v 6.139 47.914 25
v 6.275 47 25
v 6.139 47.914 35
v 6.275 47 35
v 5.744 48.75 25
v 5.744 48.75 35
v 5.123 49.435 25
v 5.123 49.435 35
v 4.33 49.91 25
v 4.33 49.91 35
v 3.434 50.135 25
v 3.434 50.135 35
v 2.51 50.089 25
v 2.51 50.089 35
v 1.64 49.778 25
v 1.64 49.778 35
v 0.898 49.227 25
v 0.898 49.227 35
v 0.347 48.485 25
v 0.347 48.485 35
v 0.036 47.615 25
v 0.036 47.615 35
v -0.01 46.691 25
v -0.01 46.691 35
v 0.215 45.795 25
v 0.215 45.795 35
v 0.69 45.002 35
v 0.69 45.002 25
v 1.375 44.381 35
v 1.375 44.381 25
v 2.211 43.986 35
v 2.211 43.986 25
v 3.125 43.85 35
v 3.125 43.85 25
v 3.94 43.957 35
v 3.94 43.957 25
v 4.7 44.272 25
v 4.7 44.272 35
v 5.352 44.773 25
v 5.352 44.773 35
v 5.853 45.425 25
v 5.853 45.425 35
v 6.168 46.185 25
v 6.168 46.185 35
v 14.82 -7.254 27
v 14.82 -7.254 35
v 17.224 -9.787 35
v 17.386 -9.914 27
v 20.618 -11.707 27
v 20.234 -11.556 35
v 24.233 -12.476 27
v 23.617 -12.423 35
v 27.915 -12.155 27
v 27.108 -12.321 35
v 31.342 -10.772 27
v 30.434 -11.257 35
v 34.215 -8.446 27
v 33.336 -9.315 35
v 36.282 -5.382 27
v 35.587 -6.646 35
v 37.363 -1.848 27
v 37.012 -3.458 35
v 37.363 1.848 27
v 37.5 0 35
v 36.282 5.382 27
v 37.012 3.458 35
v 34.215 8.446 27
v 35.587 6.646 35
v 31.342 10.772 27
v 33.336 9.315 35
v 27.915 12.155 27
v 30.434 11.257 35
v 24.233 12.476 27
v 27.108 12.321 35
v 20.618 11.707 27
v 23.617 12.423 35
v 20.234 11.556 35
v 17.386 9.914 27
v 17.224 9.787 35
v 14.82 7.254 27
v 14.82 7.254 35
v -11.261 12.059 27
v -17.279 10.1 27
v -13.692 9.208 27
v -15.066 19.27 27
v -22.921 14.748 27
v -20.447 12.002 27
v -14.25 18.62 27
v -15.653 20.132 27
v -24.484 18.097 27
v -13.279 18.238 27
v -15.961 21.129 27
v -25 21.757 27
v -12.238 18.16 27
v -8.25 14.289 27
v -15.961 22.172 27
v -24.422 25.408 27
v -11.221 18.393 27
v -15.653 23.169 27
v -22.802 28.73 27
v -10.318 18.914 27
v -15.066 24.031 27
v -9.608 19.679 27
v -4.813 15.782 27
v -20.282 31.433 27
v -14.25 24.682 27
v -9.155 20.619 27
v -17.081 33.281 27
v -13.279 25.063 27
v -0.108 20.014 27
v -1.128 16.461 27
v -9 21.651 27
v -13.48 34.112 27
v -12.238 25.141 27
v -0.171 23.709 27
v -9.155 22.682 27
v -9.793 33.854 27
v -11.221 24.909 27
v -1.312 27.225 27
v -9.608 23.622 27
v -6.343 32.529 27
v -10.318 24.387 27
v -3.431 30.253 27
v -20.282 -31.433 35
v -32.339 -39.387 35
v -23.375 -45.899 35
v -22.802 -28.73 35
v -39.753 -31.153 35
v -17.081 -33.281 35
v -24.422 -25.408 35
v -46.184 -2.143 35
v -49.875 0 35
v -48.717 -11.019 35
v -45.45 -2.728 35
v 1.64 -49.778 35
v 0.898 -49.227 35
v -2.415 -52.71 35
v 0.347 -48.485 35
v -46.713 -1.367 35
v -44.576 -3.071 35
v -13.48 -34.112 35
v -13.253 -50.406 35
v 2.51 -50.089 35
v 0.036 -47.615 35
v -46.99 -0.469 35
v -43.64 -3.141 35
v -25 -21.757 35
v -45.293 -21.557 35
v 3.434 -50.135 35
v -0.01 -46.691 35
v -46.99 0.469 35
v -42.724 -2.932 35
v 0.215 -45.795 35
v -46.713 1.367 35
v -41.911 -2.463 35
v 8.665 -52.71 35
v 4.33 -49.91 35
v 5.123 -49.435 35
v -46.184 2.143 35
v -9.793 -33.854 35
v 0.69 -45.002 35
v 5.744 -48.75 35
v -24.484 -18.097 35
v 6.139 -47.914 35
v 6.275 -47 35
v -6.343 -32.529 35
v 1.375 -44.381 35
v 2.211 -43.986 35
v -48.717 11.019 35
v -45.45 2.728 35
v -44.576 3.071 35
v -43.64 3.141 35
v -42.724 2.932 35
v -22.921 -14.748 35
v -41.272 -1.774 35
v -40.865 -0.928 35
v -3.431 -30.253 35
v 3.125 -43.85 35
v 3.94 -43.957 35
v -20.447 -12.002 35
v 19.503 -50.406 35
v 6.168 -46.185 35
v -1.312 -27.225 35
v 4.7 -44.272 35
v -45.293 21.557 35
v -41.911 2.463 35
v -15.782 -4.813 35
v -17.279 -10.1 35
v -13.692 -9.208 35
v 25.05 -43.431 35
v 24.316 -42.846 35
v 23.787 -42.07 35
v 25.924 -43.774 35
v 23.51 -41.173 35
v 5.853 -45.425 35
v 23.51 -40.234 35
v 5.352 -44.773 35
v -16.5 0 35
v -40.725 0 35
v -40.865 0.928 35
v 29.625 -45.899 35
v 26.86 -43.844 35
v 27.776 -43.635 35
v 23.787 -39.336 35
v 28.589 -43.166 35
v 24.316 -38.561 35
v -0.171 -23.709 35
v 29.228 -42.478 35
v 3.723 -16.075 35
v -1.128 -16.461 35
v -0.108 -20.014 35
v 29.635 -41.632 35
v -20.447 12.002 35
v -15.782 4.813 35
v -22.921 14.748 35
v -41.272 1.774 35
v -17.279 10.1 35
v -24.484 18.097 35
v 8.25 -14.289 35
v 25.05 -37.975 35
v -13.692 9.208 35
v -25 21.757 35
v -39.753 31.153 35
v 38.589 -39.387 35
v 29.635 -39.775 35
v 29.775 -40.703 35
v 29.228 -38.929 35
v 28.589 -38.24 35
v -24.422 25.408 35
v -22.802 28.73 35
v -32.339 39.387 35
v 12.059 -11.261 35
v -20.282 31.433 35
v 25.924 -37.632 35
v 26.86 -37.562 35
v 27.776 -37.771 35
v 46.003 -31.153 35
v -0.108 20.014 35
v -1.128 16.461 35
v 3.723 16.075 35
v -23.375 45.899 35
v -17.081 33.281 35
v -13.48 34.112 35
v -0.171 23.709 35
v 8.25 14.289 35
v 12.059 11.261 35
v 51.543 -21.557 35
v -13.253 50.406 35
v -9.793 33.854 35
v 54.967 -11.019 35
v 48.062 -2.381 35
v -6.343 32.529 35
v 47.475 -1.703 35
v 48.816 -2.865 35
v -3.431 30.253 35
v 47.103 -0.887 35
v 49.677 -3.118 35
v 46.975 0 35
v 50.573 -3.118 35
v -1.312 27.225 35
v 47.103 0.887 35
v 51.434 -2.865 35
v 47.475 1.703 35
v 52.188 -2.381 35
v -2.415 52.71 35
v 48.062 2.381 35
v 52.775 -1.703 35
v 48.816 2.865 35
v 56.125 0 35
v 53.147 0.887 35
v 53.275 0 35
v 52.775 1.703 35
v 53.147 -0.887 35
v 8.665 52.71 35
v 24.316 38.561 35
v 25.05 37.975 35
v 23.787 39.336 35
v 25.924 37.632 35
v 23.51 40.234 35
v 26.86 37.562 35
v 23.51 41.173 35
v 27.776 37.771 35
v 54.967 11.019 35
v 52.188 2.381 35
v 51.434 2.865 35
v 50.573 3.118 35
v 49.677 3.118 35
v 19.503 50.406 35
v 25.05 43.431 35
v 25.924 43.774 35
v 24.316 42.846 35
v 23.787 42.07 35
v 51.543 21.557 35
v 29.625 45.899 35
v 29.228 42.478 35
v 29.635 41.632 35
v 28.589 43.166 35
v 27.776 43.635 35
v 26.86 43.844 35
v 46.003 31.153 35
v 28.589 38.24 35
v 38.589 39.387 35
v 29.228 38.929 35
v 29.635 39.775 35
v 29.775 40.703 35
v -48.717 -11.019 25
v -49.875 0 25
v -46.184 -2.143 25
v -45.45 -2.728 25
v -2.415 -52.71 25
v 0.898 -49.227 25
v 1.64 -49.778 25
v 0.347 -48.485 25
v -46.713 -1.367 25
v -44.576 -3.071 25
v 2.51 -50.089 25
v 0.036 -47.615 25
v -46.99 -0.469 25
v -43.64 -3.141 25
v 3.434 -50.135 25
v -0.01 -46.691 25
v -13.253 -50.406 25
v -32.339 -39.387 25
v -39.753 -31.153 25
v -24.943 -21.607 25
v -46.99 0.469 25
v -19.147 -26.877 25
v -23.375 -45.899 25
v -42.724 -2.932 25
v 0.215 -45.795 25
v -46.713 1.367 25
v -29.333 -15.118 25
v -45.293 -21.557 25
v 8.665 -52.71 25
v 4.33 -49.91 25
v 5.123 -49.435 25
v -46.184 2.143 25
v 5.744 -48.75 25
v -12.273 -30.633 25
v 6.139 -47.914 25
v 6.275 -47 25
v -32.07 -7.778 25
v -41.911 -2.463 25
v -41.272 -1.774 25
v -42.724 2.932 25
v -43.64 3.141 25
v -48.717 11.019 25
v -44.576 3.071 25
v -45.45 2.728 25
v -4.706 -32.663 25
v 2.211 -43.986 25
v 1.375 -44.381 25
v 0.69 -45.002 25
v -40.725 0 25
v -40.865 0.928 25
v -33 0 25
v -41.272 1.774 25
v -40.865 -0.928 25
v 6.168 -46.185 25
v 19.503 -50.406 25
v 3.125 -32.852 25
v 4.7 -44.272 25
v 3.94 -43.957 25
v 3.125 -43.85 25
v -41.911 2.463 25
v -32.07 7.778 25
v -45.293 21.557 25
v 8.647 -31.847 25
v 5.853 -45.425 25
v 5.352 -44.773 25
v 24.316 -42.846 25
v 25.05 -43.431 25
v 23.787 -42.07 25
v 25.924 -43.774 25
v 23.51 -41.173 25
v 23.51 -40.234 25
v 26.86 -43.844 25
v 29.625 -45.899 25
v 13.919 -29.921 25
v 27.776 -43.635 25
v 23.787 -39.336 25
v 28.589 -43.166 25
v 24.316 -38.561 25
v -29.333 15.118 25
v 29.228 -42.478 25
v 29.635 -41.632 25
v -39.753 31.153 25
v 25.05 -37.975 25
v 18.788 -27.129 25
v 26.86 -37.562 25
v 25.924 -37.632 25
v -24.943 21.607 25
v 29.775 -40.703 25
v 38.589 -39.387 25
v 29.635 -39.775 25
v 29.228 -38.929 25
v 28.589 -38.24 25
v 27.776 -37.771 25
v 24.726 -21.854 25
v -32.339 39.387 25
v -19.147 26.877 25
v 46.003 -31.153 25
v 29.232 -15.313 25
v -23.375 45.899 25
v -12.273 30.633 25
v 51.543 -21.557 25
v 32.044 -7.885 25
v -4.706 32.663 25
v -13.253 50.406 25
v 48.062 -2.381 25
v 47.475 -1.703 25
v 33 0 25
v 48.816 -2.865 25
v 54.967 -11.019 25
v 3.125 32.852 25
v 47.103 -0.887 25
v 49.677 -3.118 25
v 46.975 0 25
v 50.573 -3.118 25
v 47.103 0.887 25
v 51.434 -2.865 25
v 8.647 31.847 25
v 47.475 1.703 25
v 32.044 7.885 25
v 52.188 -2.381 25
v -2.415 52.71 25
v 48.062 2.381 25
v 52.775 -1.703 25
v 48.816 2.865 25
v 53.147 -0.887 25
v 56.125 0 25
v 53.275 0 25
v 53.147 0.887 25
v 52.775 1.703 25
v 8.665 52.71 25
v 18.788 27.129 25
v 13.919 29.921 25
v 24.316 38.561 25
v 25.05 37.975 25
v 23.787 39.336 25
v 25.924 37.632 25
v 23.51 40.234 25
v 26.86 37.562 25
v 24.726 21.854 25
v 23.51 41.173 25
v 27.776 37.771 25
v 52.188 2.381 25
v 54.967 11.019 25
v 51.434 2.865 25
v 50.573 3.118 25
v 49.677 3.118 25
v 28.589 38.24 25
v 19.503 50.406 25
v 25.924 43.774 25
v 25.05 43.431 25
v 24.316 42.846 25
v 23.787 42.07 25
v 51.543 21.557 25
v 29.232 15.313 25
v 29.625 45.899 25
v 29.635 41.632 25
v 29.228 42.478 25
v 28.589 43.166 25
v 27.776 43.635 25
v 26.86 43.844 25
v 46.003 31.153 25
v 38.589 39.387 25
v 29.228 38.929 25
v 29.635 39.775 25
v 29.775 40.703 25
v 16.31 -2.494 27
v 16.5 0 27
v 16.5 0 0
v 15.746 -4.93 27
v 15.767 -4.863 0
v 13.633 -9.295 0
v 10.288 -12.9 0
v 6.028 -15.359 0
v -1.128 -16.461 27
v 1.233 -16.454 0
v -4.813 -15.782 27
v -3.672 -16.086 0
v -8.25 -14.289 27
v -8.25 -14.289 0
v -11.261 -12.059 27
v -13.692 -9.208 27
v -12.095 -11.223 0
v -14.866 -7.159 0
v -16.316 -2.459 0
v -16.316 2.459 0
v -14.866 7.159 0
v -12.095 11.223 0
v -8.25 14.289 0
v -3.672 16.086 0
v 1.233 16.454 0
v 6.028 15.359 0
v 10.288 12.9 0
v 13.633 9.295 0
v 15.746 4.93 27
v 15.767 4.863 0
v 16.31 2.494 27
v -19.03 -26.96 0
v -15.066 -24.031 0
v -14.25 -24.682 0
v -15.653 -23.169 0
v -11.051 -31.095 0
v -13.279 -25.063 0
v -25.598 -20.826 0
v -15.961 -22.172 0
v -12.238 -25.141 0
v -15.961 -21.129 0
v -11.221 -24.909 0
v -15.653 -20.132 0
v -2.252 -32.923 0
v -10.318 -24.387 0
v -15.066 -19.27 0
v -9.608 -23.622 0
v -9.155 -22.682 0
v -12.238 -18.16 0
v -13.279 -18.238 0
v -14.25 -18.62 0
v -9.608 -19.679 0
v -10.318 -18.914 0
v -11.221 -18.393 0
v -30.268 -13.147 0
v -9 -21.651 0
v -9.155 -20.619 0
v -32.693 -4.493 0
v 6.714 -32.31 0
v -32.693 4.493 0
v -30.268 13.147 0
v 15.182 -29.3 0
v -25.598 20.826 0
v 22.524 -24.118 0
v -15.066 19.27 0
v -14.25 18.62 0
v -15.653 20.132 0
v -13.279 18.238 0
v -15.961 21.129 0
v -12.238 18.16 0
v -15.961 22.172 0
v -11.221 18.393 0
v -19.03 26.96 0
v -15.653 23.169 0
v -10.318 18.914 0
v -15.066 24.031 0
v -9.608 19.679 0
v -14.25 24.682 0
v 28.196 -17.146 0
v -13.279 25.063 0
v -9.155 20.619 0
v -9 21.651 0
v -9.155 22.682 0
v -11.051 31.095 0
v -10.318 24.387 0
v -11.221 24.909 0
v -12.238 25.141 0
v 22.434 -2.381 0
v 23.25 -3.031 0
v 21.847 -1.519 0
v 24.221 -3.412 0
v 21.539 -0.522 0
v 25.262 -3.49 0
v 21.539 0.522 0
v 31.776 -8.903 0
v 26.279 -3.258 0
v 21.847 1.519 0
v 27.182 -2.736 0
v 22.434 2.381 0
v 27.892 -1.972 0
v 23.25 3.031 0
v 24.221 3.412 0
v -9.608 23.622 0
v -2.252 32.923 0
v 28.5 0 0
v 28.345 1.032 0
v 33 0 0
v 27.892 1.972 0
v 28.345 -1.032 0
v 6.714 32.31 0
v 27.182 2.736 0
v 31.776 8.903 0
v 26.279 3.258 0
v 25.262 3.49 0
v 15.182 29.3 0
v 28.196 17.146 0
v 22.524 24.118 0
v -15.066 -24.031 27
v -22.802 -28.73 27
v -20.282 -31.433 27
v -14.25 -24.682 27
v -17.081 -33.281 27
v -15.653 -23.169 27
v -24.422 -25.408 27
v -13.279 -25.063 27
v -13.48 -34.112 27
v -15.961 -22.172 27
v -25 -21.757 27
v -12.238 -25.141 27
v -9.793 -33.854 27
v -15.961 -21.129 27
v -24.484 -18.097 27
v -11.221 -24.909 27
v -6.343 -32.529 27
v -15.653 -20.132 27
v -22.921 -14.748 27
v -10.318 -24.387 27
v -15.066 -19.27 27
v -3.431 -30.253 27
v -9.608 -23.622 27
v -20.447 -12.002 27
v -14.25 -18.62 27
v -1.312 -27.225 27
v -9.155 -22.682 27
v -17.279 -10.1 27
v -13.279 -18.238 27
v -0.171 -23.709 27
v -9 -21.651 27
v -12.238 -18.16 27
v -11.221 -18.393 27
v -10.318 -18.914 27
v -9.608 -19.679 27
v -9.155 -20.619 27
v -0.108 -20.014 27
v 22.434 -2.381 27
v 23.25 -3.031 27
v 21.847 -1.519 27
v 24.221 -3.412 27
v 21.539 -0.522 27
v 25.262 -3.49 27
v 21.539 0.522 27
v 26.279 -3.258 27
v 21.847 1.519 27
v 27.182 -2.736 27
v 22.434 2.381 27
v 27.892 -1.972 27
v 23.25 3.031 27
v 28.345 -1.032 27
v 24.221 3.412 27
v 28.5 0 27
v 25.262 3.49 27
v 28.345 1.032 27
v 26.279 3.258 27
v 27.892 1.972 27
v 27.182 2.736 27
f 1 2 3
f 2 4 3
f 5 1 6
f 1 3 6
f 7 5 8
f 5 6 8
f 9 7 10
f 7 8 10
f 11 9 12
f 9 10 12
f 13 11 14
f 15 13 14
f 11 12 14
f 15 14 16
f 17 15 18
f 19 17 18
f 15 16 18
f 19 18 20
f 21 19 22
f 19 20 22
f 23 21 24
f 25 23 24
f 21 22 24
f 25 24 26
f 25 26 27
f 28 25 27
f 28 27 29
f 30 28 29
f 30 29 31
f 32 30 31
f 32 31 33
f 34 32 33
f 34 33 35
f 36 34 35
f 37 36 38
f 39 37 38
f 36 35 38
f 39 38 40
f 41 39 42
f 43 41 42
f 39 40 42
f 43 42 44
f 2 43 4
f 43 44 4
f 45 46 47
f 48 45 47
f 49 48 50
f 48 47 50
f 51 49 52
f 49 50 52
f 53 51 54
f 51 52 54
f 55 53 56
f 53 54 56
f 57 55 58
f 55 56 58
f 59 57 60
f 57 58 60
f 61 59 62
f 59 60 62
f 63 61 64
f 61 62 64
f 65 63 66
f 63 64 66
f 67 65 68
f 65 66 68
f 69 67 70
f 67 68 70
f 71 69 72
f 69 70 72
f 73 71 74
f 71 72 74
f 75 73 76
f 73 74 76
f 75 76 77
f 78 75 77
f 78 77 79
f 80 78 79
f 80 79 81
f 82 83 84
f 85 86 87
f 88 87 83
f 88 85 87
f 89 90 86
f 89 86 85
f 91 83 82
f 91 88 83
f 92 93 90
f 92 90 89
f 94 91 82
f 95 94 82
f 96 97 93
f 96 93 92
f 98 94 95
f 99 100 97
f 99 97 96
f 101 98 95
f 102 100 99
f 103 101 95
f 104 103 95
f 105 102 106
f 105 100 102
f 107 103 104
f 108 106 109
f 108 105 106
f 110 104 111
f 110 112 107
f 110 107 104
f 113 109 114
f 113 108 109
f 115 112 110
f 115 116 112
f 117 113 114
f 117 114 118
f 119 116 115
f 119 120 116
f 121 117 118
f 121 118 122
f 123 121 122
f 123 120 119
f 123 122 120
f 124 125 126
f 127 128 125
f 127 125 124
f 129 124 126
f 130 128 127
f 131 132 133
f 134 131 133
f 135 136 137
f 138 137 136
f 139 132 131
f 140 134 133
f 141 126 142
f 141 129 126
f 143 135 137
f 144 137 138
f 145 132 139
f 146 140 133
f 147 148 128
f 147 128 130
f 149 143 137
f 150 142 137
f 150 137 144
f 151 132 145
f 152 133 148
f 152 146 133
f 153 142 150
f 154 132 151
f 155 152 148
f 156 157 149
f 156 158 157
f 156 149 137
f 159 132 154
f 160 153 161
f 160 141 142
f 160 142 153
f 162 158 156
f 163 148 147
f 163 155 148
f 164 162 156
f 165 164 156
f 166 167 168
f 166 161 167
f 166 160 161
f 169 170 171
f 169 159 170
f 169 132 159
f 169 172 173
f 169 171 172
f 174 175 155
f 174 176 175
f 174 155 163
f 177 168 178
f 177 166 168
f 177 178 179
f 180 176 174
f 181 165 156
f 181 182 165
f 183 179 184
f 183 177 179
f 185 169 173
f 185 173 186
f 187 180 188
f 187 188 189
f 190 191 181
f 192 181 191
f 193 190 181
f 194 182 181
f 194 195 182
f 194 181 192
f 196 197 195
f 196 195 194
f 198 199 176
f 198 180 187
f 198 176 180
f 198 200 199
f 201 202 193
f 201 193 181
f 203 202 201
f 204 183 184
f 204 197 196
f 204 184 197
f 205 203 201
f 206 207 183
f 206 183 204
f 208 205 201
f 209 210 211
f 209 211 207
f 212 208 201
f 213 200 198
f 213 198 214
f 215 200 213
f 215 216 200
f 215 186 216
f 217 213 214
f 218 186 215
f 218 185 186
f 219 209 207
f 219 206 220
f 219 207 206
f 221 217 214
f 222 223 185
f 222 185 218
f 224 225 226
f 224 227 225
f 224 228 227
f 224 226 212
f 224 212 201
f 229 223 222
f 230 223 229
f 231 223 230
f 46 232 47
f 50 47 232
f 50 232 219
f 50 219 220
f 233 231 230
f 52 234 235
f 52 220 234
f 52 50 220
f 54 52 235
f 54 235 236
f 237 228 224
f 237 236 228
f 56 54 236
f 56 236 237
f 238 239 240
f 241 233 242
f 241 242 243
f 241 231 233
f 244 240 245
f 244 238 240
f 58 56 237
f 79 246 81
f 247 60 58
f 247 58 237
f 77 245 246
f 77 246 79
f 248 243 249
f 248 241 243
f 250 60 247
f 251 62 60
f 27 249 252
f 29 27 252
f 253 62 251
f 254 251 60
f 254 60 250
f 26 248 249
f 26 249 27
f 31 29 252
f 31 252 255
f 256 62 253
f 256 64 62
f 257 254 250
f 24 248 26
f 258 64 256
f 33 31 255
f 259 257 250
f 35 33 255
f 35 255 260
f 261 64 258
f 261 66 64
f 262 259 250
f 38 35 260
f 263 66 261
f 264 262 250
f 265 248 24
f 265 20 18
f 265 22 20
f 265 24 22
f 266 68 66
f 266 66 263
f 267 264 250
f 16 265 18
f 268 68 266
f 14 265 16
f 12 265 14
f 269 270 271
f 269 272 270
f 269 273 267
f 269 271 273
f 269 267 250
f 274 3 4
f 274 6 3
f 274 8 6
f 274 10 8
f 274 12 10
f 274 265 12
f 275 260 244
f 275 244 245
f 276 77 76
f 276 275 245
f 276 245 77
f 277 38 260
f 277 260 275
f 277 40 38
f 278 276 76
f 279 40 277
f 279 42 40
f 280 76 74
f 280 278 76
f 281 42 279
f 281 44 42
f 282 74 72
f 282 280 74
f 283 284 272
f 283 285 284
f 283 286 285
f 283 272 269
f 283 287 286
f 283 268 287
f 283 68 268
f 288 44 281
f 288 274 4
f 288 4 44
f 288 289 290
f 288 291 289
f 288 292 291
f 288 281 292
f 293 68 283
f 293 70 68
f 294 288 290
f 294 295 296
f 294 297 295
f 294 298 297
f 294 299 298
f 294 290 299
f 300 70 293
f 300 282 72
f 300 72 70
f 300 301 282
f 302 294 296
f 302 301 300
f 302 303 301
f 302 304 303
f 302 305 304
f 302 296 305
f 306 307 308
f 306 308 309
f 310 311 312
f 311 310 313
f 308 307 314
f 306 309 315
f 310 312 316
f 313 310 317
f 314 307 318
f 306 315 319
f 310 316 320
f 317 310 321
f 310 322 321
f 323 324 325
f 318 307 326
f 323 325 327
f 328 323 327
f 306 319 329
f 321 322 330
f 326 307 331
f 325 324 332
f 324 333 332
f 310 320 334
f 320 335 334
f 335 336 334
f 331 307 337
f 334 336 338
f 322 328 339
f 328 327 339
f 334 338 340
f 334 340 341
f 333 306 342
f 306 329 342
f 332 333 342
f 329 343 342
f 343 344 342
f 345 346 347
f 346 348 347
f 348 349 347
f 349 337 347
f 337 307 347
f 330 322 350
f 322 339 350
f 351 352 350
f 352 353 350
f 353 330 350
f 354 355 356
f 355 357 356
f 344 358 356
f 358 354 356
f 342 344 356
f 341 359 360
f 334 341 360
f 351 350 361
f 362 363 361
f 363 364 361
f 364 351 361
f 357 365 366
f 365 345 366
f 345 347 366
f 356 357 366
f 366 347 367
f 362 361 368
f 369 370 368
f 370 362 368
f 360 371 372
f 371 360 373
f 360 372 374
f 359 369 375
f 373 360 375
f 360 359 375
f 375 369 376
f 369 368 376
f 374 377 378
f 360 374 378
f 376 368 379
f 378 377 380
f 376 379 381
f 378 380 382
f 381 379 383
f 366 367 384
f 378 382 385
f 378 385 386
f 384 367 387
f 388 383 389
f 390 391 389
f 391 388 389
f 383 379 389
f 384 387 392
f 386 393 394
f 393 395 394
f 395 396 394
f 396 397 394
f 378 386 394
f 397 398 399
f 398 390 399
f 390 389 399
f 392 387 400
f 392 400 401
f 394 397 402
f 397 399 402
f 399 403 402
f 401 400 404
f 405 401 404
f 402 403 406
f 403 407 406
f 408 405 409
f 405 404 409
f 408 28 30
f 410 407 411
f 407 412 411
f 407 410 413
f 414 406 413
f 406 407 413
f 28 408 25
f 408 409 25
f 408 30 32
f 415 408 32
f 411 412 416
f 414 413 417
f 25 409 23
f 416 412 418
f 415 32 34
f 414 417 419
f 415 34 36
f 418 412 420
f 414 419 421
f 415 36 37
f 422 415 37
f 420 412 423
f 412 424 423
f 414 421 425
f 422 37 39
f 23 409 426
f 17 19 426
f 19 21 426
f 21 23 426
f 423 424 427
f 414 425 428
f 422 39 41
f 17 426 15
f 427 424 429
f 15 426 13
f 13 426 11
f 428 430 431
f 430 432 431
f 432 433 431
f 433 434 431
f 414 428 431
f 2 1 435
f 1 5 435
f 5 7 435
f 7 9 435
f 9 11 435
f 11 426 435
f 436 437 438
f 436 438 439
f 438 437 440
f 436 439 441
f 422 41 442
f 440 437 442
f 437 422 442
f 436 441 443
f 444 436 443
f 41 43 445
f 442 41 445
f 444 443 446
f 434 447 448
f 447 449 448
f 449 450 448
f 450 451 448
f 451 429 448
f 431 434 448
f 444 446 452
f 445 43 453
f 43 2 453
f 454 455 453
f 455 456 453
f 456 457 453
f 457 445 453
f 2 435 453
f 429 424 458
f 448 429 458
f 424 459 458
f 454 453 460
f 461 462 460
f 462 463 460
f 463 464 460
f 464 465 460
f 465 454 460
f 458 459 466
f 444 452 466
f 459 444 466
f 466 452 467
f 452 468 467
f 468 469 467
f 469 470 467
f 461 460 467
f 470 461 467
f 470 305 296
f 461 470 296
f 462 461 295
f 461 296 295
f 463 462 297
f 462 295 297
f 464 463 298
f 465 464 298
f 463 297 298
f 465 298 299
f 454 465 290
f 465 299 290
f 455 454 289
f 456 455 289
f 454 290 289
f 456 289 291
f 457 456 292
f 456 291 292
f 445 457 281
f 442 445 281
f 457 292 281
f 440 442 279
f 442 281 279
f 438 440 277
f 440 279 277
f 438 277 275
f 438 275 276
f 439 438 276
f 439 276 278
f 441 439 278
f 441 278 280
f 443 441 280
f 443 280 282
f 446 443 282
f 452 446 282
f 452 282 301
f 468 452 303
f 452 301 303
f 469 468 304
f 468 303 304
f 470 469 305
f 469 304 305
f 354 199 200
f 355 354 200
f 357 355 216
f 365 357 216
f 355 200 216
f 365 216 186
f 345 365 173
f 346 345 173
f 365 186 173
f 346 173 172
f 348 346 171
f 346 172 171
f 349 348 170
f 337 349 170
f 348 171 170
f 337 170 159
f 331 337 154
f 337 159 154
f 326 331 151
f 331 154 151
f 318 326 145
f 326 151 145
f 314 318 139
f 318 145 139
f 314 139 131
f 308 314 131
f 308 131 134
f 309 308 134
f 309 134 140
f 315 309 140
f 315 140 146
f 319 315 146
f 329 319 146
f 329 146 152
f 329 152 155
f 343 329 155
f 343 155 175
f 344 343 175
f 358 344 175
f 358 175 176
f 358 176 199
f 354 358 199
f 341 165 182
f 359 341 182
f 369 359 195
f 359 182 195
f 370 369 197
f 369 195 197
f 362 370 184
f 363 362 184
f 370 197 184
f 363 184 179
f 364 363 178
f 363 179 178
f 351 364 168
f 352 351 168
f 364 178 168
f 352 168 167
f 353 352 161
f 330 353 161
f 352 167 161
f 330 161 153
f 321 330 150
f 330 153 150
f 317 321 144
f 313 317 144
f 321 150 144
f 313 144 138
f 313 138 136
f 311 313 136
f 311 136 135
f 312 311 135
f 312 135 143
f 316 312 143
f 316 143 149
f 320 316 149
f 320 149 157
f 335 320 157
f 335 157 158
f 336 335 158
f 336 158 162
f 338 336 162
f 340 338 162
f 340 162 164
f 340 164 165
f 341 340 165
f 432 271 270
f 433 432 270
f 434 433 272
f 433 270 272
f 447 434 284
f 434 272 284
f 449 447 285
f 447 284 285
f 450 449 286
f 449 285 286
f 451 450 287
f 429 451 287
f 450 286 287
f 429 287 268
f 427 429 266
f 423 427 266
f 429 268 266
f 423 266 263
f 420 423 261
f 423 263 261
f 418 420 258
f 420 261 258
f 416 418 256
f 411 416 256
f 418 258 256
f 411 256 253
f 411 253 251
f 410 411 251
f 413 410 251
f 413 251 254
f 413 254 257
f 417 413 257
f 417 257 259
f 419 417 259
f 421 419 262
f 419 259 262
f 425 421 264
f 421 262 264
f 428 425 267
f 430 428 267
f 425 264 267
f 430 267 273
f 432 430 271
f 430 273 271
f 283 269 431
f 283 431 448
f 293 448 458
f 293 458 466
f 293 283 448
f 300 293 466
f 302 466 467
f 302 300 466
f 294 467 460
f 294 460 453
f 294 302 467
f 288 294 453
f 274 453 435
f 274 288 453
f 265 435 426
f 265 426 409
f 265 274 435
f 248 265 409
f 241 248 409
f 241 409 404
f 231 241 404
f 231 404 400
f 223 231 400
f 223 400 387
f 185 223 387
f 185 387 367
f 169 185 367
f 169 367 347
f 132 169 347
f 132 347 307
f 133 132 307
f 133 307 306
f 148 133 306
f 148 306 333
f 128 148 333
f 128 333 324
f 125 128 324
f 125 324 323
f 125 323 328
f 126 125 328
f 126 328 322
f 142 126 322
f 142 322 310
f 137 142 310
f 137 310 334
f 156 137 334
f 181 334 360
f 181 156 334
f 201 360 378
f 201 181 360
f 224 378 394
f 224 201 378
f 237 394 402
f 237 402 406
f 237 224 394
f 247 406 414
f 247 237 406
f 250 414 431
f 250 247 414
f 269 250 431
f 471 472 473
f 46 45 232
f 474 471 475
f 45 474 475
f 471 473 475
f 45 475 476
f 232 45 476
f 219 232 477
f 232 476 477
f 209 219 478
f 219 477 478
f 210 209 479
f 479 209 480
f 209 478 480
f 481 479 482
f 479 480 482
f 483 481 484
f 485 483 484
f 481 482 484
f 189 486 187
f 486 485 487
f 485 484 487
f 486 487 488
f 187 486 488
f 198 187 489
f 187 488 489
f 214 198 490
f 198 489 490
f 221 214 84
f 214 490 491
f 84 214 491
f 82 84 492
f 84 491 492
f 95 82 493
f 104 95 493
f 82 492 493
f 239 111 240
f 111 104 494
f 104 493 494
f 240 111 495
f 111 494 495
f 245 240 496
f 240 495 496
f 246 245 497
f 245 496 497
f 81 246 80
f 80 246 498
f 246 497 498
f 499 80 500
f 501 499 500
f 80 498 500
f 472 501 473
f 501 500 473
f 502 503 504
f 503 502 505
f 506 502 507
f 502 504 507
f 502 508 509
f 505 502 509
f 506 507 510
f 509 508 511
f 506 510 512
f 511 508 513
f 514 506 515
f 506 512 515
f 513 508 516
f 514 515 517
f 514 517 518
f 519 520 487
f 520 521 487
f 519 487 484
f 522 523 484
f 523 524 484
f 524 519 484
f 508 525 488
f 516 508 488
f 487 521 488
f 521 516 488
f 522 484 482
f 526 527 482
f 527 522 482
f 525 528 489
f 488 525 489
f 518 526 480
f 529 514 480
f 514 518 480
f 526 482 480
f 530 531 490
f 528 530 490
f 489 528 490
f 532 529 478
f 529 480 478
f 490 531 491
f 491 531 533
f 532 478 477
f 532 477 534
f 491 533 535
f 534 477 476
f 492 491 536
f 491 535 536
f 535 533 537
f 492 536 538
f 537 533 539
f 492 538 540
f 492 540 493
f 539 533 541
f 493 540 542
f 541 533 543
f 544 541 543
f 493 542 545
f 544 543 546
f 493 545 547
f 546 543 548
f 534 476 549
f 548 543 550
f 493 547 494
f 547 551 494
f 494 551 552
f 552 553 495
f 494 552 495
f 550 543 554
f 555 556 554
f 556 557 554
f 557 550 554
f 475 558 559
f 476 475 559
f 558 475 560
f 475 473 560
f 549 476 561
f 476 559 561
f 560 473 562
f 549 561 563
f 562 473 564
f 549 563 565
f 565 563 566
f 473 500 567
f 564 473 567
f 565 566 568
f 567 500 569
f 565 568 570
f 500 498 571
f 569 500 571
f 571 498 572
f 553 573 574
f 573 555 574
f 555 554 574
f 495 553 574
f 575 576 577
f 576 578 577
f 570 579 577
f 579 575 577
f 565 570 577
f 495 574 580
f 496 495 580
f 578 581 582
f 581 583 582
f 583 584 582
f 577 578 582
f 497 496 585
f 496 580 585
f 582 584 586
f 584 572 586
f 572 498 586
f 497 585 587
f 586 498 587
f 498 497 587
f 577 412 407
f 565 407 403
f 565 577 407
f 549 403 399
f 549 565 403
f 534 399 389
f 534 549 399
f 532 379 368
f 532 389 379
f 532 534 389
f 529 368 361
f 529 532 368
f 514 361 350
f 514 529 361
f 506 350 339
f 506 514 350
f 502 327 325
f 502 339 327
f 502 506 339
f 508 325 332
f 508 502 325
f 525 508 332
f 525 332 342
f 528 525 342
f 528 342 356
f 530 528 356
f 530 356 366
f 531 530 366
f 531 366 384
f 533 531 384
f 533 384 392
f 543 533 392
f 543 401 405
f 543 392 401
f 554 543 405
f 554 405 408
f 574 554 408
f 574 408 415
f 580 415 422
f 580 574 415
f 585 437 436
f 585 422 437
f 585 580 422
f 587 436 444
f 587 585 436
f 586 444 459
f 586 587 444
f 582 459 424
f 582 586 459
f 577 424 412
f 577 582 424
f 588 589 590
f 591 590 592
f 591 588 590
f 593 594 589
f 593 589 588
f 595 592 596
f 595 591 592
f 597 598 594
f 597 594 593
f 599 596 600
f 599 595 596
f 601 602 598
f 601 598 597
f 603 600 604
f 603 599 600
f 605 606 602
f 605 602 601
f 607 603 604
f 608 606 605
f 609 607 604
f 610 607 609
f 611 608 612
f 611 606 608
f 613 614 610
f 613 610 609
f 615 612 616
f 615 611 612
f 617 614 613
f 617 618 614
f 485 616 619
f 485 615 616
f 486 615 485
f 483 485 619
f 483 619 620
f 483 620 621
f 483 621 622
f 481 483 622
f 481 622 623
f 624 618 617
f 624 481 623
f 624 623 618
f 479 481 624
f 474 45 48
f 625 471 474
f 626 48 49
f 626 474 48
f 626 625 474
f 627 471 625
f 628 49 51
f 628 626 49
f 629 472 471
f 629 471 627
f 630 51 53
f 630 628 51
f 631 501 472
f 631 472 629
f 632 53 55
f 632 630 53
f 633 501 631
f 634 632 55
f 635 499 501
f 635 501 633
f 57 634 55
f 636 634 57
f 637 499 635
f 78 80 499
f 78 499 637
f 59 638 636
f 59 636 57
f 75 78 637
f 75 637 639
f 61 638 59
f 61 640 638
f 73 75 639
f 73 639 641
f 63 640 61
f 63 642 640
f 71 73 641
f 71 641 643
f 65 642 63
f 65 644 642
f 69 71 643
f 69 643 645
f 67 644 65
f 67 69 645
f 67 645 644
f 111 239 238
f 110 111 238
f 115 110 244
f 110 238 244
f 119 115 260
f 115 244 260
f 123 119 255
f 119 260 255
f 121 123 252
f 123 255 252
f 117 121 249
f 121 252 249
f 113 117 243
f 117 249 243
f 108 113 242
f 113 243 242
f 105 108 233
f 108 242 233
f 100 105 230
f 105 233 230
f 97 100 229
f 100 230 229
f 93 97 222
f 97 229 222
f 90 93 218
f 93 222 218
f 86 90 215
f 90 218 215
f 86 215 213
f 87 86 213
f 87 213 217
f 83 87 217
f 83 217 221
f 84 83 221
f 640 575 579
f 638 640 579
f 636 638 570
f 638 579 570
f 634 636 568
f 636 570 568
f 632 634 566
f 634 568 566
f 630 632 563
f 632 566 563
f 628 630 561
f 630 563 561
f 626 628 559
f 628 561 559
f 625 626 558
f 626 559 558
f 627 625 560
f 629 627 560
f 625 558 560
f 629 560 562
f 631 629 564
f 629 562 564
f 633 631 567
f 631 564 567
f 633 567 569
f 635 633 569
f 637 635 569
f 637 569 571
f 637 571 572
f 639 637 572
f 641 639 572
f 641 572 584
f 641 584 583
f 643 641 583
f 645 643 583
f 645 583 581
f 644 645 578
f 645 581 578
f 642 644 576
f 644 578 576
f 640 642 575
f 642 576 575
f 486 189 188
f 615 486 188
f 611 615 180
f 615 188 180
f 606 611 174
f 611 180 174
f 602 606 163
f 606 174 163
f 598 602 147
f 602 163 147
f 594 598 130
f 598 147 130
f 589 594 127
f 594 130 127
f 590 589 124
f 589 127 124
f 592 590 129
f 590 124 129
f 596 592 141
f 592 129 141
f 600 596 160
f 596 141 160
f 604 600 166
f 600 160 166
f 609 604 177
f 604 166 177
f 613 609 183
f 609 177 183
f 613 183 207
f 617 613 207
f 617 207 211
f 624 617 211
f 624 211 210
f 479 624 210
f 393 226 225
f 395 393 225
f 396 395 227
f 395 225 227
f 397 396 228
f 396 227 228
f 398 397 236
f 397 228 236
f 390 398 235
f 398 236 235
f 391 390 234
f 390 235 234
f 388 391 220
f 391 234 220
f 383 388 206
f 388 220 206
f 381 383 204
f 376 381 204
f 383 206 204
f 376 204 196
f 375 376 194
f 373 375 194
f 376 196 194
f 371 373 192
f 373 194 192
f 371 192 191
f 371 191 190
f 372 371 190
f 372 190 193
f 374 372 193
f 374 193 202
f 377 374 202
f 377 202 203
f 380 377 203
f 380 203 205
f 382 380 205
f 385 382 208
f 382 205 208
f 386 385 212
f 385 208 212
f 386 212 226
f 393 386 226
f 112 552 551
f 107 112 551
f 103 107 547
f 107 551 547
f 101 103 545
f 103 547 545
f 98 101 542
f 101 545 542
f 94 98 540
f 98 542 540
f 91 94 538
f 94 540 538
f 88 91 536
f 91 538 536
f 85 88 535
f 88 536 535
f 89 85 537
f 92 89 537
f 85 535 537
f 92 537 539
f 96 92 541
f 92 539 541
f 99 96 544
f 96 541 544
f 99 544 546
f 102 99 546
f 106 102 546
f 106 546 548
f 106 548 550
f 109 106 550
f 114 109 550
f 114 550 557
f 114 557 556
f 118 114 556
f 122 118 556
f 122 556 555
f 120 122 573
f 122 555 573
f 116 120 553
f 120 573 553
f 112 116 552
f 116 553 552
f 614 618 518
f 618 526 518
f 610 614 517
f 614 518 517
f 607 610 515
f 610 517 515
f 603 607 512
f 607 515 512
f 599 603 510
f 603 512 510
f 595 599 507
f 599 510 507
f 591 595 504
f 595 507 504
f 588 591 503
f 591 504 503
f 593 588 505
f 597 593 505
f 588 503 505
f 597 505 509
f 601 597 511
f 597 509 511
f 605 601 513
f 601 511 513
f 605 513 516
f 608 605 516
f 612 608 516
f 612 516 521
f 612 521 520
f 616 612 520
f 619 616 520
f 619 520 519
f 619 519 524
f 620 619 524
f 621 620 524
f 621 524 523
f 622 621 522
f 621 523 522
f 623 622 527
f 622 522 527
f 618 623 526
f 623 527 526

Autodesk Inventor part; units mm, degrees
ref_plane "YZ Plane" through (0, 0, 0) normal (1, 0, 0) x (0, 1, 0)
ref_plane "XZ Plane" through (0, 0, 0) normal (0, 1, 0) x (-1, 0, 0)
ref_plane "XY Plane" through (0, 0, 0) normal (0, 0, 1) x (1, 0, 0)
sketch "Sketch1" plane through (0, 0, 0) normal (0, 0, 1) x (1, 0, 0)
  circle A0 centre (0, 0) radius 33
  circle A1 centre (0, 0) radius 16.5
  circle A2 centre (25, 0) radius 3.5
  circle A3 centre (-12.5, 21.6506) radius 3.5
  circle A4 centre (-12.5, -21.6506) radius 3.5
  dimension "d0" = 66
  dimension "d1" = 33
  dimension "d2" = 7
  dimension "d3" = 25
  dimension "d6" = 360
extrude "Extrusion1" add sketch "Sketch1" along normal blind 35
sketch "Sketch3" plane through (0, 0, 35) normal (0, 0, 1) x (1, 0, 0)
  circle A0 centre (3.125, 0) radius 53
  circle A1 centre (0, 0) radius 10
  circle A2 centre (26.625, -40.7032) radius 3.15
  circle A3 centre (18.75, 0) radius 5.5
  circle A4 centre (50.125, 0) radius 3.15
  circle A5 centre (26.625, 40.7032) radius 3.15
  circle A6 centre (3.125, -47) radius 3.15
  circle A7 centre (3.125, 47) radius 3.15
  circle A8 centre (-43.875, 0) radius 3.15
  line L0 (3.125, 0) -> (3.125, 47)
  line L1 (3.125, 0) -> (26.625, 40.7032)
  line L2 (3.125, 0) -> (50.125, 0)
  line L3 (26.625, -40.7032) -> (3.125, 0)
  line L4 (3.125, 0) -> (3.125, -47)
  line L5 (3.125, 0) -> (-43.875, 0)
  circle A9 centre (0, 0) radius 33 projected
  point P0 (0, 0)
  dimension "d19" = 106
  dimension "d20" = 6.3
  dimension "d21" = 6.3
  dimension "d22" = 6.3
  dimension "d23" = 6.3
  dimension "d24" = 6.3
  dimension "d25" = 6.3
  dimension "d27" = 20
  dimension "d28" = 18.75
  dimension "d35" = 30
  dimension "d36" = 30
  dimension "d37" = 3.125
  dimension "d38" = 11
  dimension "d41" = 47
  dimension "d44" = 47
  dimension "d45" = 47
  dimension "d46" = 47
  dimension "d47" = 47
  dimension "d48" = 47
extrude "Extrusion4" add sketch "Sketch3" against normal blind 10
sketch "Sketch4" plane through (3.125, 0, 35) normal (0, 0, 1) x (1, 0, 0)
  circle A0 centre (18.75, 0) radius 7.5
  point P0 (-3.125, 0)
  dimension "d49" = 15
  dimension "d50" = 21.875
extrude "Extrusion5" cut sketch "Sketch4" against normal blind 5
sketch "Sketch5" plane through (3.125, 0, 35) normal (0, 0, 1) x (1, 0, 0)
  circle A0 centre (21.875, 0) radius 3.5 projected
  circle A1 centre (21.875, 0) radius 3.5 projected
  circle A2 centre (21.875, 0) radius 12.5
  circle A3 centre (-15.625, 21.6506) radius 12.5
  circle A4 centre (-15.625, -21.6506) radius 12.5
  point P0 (-3.125, 0)
  dimension "d53" = 25
  dimension "d56" = 360
extrude "Extrusion6" cut sketch "Sketch5" against normal blind 8 contours A0 | A2 | A3 | A4
properties part number "AC10" material "ABS Plastic"
